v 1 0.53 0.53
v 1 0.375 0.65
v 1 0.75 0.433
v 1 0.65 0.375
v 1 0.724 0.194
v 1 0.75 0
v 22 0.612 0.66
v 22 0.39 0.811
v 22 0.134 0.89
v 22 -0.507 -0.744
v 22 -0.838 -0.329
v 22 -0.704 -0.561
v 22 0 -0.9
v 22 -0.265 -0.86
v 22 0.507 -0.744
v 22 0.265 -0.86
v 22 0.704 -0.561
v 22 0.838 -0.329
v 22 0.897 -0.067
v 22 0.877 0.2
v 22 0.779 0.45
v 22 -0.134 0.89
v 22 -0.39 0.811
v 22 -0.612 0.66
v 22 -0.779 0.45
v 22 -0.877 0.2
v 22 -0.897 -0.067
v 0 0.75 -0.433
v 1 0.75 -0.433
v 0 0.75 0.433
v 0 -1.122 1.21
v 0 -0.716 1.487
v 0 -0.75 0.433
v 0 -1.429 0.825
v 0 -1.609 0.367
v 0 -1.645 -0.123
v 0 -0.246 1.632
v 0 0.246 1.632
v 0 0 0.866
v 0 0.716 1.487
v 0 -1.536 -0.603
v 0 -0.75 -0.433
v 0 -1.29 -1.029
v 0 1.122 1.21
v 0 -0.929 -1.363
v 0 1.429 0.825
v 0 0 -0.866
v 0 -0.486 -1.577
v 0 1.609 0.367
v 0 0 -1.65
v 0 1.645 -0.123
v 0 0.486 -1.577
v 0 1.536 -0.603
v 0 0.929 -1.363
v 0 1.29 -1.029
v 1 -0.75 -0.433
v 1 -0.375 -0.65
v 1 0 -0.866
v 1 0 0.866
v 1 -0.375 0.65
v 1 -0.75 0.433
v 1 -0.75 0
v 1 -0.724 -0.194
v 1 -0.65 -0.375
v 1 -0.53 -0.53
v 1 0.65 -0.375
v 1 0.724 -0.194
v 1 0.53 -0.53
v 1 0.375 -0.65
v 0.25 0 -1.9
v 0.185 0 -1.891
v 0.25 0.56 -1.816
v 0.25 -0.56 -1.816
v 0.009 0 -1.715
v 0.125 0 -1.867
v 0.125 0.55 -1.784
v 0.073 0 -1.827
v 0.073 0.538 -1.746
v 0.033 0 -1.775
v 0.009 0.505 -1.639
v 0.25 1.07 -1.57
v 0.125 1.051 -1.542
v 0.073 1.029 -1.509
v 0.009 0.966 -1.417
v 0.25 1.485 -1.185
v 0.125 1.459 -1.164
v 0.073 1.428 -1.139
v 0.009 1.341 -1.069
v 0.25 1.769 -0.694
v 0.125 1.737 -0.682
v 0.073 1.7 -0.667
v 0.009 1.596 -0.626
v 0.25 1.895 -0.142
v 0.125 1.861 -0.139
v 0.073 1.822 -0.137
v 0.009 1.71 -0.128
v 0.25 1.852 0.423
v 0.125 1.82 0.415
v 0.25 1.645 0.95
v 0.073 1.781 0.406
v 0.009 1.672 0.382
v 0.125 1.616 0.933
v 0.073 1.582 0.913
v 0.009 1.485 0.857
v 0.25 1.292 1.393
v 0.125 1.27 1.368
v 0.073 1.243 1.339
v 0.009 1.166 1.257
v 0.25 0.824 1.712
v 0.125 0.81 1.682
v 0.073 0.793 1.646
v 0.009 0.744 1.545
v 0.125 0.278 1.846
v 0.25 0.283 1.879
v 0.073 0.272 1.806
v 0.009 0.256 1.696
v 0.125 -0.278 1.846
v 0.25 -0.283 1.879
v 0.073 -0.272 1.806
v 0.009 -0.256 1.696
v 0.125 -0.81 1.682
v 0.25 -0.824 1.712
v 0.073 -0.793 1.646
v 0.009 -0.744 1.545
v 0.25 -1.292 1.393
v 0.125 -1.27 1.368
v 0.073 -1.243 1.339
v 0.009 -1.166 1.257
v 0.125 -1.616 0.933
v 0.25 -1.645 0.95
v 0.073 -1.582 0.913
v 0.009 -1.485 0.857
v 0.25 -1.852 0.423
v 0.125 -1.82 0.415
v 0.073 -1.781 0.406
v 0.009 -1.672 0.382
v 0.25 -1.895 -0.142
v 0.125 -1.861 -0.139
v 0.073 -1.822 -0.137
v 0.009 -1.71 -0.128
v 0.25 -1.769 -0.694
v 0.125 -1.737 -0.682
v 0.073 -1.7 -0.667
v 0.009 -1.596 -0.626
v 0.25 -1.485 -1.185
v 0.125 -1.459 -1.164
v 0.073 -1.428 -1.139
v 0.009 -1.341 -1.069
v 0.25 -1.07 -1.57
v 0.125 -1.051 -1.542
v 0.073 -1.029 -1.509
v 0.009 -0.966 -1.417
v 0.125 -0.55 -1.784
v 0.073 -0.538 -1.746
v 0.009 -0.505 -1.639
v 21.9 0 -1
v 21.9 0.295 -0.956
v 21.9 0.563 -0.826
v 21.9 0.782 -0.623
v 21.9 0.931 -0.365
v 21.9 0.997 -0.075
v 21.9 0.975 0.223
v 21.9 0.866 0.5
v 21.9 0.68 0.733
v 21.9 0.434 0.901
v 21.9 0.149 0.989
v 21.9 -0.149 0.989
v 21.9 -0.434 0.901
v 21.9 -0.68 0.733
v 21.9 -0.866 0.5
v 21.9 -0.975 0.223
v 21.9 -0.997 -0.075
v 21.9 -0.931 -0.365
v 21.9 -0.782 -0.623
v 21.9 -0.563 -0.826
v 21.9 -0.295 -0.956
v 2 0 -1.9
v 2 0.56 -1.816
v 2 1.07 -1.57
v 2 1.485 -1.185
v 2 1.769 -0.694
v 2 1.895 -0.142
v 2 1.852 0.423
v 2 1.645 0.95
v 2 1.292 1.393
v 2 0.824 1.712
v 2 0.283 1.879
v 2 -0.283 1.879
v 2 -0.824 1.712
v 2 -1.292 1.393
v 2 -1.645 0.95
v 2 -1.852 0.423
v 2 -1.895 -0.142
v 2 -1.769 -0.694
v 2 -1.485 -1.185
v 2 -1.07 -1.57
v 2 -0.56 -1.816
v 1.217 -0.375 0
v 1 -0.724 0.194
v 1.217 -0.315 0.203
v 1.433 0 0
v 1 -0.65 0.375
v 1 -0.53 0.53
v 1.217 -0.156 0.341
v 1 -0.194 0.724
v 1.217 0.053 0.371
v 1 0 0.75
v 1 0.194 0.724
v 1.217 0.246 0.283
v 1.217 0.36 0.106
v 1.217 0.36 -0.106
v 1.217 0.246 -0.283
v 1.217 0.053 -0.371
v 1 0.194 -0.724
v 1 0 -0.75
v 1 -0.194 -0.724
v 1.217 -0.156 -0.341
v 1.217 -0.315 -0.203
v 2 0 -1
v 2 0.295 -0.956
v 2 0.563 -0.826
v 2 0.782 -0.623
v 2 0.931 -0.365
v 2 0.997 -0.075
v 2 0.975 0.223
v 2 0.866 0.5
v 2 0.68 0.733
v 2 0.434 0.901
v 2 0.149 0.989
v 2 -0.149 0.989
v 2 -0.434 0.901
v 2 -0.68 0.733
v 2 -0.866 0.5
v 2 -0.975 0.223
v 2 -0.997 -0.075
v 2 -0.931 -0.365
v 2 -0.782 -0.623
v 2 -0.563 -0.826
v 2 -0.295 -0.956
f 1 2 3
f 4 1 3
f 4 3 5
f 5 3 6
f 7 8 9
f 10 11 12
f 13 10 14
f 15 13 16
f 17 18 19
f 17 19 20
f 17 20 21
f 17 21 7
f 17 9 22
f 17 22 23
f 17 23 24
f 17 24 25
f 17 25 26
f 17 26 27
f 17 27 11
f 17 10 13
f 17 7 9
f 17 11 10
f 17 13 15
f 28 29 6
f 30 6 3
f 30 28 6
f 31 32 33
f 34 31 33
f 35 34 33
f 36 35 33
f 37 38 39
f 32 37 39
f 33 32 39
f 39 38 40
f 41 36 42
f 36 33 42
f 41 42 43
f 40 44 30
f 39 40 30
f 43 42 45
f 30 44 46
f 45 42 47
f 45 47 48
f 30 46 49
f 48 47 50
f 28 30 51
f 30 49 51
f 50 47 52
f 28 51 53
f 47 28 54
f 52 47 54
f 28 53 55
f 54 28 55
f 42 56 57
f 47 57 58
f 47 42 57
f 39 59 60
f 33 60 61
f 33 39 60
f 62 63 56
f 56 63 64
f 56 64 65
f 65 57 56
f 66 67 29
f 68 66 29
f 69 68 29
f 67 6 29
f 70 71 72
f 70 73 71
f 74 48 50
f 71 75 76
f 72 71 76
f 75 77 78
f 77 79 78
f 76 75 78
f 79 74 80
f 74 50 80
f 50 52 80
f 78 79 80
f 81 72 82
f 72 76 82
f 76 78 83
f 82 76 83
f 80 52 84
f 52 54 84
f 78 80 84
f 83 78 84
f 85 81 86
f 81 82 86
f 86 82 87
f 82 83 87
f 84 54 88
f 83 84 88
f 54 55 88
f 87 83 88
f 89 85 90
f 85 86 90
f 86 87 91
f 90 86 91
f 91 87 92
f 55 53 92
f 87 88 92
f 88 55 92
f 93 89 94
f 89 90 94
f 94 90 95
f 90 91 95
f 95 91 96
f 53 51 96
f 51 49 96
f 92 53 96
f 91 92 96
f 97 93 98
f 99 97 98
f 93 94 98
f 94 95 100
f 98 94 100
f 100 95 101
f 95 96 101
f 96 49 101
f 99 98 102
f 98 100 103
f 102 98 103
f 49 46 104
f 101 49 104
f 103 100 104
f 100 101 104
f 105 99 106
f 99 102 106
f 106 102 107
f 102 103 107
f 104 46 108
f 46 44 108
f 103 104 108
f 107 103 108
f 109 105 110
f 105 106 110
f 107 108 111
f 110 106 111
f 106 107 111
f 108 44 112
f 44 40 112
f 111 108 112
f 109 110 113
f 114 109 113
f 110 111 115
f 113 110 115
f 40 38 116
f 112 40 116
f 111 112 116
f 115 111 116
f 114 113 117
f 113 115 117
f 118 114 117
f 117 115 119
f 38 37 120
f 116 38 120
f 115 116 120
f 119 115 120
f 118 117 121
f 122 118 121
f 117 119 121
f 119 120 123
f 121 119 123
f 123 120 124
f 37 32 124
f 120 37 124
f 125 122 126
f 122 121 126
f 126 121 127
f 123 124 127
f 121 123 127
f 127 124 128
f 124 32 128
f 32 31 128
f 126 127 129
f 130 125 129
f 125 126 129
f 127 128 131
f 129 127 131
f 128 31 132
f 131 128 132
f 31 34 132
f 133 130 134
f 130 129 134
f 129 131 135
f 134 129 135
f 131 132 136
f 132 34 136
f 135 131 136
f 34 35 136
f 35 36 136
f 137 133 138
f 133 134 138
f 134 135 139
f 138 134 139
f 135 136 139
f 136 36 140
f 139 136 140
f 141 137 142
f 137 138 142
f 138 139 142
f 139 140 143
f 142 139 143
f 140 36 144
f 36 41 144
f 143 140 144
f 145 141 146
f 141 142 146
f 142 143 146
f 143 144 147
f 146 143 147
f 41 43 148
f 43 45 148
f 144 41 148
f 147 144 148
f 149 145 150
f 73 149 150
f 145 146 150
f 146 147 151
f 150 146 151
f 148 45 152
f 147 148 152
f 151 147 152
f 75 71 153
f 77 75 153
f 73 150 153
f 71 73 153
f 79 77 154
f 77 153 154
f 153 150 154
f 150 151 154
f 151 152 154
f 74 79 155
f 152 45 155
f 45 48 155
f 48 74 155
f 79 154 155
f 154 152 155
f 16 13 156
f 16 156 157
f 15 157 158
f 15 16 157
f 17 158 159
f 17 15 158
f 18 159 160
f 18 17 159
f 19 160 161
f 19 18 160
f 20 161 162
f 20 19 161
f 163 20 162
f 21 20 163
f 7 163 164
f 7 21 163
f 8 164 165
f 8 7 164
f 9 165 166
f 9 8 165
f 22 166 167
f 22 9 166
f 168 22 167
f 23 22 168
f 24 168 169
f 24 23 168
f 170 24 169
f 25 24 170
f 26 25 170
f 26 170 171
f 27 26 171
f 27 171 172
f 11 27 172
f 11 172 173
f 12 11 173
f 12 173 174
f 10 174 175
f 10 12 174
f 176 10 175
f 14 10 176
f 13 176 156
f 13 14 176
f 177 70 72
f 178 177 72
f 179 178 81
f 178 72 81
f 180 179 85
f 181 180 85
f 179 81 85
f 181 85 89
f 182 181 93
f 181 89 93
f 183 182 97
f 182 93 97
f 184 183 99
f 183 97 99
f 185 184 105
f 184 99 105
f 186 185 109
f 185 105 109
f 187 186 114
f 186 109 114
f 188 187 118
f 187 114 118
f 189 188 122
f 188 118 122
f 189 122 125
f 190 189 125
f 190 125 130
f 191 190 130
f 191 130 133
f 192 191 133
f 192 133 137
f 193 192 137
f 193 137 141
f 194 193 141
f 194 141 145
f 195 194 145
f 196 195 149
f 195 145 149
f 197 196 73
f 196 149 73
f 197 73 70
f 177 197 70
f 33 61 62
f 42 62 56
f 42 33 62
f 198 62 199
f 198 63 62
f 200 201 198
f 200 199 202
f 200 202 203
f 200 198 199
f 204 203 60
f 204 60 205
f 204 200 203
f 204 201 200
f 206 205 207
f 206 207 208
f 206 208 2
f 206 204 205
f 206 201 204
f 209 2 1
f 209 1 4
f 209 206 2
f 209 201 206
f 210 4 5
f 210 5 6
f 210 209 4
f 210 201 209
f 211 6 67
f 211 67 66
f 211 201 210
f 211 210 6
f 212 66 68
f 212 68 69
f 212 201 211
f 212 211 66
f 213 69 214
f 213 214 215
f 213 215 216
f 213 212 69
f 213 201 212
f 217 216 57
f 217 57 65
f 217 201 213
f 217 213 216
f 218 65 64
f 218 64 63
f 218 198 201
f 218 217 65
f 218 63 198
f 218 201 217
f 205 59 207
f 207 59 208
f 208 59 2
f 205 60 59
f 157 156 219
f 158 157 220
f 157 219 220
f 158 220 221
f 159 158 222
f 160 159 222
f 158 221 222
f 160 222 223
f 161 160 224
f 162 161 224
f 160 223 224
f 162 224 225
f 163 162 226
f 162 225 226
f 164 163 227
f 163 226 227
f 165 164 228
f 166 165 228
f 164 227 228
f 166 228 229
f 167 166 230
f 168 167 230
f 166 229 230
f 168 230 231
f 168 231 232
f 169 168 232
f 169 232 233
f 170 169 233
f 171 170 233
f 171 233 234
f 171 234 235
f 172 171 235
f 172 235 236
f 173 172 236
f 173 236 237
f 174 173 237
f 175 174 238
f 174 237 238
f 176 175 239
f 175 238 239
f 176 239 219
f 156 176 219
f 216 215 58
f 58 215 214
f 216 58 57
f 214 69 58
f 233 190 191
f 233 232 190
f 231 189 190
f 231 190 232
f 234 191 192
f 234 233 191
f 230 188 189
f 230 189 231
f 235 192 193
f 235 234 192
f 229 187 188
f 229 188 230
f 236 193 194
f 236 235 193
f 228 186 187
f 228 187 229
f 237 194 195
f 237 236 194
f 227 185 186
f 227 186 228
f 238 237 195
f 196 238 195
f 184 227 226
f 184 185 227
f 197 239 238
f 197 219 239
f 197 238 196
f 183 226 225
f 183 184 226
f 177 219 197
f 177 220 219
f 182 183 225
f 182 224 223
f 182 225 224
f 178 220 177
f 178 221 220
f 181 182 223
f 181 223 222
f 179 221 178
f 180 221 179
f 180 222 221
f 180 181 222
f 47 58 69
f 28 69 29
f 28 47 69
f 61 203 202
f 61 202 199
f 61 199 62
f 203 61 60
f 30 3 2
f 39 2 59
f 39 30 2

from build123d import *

# Parameters (mm, degrees)
SKETCH1_R           = 1.9
BASEHEAD_DEPTH      = 2
SKETCH2_R           = 1
BASEBODY_DEPTH      = 20
HEXAGONSOCKET_DEPTH = 1
TOPFILLET_R         = 0.25
CHAMFER1_SIZE       = 0.1


with BuildPart() as part:
    # Sketch1 → BaseHead (new body)
    with BuildSketch(Plane(origin=(0, 0, 0), x_dir=(0, 0, -1), z_dir=(1, 0, 0))):
        Circle(SKETCH1_R)
    extrude(amount=BASEHEAD_DEPTH)

    # Sketch2 → BaseBody (add)
    with BuildSketch(Plane(origin=(2, 0, 0), x_dir=(0, 0, -1), z_dir=(1, 0, 0))):
        Circle(SKETCH2_R)
    extrude(amount=BASEBODY_DEPTH)

    # Sketch3 → HexagonSocket (cut)
    with BuildSketch(Plane(origin=(0, 0, 0), x_dir=(0, 0, -1), z_dir=(1, 0, 0))):
        Polygon((0.866025404, 0), (0.433012702, 0.75), (-0.433012702, 0.75), (-0.866025404, 0), (-0.433012702, -0.75), (0.433012702, -0.75), align=None)
    extrude(amount=HEXAGONSOCKET_DEPTH, mode=Mode.SUBTRACT)

    # Sketch4 → Cut-Revolve1 (revolve, cut)
    with BuildSketch(Plane(origin=(-4.19613823, 0.75, 0), x_dir=(-1, 0, 0), z_dir=(0, 0, 1))):
        Polygon((-5.19613823, 1.5), (-5.629150931, 0.75), (-5.19613823, 0.75), align=None)
    revolve(axis=Axis((0.838992387, 0, 0), (-1, 0, 0)), mode=Mode.SUBTRACT)

    # TopFillet
    topfillet_edges = [part.edges().sort_by_distance(p)[0] for p in [
        (0, 0, 1.9),
    ]]
    fillet(topfillet_edges, radius=TOPFILLET_R)

    # Chamfer1
    chamfer1_edges = [part.edges().sort_by_distance(p)[0] for p in [
        (22, 0, 1),
    ]]
    chamfer(chamfer1_edges, length=CHAMFER1_SIZE)


solid = part.part
